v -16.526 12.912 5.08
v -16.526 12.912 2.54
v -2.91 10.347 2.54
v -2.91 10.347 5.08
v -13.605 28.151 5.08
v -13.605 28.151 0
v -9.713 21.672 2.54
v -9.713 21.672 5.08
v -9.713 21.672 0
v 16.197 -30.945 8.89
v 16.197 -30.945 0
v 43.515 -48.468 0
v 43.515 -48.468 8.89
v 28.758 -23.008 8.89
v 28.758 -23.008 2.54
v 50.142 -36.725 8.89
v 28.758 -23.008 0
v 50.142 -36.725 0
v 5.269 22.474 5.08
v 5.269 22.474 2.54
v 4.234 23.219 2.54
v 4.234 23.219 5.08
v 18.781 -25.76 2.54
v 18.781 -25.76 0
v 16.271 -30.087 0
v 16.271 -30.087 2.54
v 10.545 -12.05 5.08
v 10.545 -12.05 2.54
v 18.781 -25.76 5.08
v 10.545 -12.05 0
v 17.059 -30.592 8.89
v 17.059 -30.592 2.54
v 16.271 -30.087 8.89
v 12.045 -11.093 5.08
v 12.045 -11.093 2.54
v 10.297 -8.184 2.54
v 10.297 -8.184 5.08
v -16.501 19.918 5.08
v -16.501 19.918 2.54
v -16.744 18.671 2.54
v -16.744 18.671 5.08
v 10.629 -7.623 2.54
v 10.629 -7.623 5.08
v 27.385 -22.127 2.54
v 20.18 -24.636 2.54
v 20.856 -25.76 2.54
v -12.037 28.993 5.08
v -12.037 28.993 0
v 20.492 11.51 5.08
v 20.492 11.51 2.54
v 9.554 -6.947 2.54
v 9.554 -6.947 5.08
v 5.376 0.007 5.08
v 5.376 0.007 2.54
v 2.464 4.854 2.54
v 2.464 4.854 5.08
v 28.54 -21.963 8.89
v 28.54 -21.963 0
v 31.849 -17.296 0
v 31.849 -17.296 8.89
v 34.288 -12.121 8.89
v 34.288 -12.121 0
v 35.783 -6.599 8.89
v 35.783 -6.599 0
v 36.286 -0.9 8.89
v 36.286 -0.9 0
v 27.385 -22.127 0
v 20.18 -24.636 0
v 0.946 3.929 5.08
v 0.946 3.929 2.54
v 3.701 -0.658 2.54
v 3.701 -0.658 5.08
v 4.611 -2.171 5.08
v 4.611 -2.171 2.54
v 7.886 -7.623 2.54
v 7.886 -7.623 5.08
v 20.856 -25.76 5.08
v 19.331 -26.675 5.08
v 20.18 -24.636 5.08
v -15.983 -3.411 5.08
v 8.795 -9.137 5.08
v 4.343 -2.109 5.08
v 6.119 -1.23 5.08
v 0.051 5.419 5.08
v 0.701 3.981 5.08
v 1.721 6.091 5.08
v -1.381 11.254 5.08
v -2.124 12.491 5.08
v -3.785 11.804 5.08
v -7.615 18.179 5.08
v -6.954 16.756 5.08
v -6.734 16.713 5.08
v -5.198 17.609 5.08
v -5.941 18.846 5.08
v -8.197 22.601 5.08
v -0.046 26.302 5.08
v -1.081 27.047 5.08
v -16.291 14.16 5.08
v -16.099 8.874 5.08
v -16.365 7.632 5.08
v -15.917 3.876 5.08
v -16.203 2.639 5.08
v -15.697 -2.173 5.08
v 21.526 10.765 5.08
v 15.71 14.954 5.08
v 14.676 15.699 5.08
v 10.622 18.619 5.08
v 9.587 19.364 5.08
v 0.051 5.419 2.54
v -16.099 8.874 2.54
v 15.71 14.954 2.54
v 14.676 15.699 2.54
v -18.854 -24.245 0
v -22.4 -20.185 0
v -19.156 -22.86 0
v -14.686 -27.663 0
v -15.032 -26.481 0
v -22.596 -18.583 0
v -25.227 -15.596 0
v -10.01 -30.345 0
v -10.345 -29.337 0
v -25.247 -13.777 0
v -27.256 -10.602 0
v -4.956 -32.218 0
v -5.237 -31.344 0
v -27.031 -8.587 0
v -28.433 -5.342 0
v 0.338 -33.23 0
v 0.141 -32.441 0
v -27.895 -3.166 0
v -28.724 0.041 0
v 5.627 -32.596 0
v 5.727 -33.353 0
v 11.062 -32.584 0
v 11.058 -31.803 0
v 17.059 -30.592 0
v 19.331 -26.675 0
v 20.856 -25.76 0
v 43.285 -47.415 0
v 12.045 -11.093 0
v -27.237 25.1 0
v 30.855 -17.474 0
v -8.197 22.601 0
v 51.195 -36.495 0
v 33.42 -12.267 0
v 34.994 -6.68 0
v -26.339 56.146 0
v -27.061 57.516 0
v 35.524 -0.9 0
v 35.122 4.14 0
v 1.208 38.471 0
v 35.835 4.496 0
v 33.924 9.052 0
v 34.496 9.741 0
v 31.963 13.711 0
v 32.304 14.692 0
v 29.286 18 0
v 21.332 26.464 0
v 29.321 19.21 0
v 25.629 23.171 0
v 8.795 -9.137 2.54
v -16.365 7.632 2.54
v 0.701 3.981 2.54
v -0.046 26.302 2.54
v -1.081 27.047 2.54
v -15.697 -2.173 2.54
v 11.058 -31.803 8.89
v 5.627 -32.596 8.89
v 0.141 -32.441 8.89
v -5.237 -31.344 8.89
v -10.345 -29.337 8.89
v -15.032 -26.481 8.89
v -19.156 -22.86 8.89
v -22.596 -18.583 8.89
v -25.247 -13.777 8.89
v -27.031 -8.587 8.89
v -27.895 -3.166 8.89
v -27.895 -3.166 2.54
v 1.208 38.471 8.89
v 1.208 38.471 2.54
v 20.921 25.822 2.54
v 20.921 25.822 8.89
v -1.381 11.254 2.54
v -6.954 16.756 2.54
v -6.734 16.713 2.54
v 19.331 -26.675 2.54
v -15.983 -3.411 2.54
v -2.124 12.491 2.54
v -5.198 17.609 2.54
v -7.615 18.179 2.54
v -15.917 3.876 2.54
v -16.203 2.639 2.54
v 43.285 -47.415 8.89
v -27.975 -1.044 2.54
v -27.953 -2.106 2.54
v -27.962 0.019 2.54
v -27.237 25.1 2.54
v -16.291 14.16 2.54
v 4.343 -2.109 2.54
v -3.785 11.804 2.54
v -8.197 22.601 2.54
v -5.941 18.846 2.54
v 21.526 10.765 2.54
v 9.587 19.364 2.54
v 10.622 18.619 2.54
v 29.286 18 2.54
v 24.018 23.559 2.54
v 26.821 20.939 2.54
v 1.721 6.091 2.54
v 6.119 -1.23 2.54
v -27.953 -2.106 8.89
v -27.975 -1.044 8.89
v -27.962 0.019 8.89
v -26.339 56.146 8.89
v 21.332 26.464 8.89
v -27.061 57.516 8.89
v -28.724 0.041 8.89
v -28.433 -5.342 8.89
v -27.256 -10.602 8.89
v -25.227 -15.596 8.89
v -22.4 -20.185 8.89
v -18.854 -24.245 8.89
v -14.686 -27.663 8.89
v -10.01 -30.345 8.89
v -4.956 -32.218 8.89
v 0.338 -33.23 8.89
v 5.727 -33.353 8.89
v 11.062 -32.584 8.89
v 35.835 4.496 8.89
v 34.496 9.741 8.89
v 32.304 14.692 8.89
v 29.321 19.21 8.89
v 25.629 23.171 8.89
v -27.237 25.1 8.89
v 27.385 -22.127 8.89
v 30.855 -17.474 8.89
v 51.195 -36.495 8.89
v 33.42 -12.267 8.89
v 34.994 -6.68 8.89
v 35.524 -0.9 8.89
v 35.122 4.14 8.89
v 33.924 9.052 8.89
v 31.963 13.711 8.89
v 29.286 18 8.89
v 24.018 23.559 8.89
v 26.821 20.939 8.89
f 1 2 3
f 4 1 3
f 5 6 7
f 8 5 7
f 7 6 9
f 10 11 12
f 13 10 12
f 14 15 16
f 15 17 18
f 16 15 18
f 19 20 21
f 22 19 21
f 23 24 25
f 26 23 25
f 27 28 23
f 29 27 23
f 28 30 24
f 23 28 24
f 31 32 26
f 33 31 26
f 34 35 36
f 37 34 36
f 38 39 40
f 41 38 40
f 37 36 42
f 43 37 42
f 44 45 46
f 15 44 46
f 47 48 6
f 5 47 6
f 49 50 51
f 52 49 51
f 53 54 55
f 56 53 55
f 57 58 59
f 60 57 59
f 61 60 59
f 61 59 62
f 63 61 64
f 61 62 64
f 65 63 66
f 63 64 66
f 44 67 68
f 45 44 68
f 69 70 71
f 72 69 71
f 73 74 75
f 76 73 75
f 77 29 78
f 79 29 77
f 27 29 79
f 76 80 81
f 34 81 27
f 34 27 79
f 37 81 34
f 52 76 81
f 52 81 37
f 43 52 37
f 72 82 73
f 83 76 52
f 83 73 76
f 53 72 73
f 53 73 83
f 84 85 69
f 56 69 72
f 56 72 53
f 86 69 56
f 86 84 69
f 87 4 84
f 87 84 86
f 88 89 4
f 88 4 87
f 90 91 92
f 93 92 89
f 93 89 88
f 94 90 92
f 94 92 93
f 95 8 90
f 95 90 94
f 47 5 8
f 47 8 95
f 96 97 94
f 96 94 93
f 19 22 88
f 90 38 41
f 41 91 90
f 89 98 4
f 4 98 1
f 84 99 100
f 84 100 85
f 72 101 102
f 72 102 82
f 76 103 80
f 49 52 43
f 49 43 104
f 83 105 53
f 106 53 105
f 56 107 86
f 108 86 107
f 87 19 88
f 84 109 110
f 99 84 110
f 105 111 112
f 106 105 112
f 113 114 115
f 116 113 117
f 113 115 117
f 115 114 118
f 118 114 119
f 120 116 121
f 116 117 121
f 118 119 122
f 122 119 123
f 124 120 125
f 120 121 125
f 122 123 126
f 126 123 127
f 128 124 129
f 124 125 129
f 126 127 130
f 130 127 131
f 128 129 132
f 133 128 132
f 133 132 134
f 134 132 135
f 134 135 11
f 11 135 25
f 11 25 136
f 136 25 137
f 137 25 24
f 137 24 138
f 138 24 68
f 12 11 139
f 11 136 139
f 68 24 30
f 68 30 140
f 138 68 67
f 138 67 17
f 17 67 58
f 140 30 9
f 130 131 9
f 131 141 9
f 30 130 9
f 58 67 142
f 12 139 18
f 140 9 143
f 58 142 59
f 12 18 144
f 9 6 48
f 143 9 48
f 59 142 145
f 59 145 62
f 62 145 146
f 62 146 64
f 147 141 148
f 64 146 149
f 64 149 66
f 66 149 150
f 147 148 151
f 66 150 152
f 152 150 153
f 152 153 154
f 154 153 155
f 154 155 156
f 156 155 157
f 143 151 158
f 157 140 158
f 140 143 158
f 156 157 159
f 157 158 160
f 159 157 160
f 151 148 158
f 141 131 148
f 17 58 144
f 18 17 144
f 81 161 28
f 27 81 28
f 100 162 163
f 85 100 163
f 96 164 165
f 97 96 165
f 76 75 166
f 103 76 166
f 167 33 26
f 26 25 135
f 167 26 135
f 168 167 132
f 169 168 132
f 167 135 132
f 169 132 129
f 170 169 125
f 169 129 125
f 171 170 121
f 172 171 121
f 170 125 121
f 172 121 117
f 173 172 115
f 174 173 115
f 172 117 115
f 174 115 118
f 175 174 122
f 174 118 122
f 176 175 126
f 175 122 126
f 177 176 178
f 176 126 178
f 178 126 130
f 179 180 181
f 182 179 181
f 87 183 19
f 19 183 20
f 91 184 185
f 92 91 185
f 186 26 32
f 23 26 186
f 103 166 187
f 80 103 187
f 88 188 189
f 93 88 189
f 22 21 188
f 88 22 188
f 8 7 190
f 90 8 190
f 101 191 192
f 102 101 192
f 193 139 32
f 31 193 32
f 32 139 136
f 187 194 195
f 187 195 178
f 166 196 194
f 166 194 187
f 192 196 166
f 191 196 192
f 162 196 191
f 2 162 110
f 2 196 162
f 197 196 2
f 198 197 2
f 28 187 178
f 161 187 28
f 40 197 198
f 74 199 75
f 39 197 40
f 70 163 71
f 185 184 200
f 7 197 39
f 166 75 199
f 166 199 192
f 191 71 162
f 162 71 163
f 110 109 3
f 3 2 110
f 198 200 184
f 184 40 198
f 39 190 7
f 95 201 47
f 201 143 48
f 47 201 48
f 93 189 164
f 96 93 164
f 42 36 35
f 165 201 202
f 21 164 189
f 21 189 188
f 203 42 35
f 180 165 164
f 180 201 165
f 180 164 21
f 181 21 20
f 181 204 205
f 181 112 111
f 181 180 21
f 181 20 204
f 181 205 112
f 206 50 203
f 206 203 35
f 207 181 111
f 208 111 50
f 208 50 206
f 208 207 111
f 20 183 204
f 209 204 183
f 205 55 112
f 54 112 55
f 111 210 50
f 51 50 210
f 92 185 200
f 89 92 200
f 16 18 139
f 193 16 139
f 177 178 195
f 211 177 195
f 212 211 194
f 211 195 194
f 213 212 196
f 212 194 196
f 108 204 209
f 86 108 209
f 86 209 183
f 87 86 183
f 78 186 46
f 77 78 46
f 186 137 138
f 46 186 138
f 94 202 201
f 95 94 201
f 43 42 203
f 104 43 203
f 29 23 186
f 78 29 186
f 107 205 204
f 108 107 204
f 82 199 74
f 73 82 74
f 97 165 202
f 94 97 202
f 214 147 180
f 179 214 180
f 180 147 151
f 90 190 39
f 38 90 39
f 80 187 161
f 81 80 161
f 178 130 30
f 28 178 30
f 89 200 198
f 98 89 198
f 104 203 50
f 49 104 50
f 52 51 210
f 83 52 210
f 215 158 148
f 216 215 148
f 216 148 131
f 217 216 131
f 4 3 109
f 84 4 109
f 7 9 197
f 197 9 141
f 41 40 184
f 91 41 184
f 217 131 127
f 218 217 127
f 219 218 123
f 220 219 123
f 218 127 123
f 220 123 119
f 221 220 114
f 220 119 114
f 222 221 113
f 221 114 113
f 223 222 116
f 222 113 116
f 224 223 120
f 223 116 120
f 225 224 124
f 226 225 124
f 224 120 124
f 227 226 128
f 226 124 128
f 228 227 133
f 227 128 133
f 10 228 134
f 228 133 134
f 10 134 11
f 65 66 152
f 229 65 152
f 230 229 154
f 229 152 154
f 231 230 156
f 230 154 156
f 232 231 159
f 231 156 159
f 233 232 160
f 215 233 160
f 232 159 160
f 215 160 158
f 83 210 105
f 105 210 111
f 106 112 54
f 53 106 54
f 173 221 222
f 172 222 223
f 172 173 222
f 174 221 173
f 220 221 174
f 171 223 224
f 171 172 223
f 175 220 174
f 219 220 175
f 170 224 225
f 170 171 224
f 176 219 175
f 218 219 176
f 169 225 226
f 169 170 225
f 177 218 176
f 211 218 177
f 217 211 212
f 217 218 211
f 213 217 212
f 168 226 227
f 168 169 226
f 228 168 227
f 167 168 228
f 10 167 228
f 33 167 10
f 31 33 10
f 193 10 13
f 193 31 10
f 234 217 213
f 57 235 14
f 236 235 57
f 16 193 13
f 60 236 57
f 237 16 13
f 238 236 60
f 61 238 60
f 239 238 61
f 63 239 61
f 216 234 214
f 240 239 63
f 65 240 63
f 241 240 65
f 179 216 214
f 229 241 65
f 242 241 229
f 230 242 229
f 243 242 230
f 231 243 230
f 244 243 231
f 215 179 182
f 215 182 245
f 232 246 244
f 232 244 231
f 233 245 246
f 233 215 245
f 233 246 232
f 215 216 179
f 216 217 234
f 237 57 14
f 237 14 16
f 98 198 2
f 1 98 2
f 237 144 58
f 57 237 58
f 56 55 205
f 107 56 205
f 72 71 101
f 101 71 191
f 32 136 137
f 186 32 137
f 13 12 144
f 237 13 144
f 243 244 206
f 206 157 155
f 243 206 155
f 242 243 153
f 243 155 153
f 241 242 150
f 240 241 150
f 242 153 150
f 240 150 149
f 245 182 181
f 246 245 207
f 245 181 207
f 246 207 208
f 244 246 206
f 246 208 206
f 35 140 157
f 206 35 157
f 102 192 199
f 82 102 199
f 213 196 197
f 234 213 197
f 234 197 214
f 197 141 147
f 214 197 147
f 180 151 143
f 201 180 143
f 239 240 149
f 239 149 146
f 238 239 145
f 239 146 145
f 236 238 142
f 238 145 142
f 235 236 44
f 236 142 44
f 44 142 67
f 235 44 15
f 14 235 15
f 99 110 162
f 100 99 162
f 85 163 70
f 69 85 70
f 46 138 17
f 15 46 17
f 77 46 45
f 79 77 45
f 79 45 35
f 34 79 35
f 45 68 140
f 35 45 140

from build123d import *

# Parameters (mm, degrees)
F1_DEPTH = 8.89
F2_DEPTH = 5.08
F3_DEPTH = 2.54


with BuildPart() as f1:
    # F0 (on Top) → F1 (new body)
    with BuildSketch(Plane.XY):
        with BuildLine():
            Line((21.332066, 26.463705), (-27.061316, 57.515545))
            Line((-27.061316, 57.515545), (-28.724159, 0.040585))
            ThreePointArc((-28.724159, 0.040585), (-14.685947, -27.662523), (16.197077, -30.944668))
            Line((16.197077, -30.944668), (43.515381, -48.467725))
            Line((43.515381, -48.467725), (51.195109, -36.495092))
            Line((51.195109, -36.495092), (28.540187, -21.963315))
            ThreePointArc((28.540187, -21.963315), (34.288342, -12.121049), (36.286243, -0.899646))
            ThreePointArc((36.286243, -0.899646), (32.30379, 14.691861), (21.332066, 26.463705))
        make_face()
        with BuildLine():
            Line((-27.236827, 25.100127), (-26.338607, 56.146439))
            Line((-26.338607, 56.146439), (1.208299, 38.470838))
            Line((1.208299, 38.470838), (20.920554, 25.822377))
            ThreePointArc((20.920554, 25.822377), (25.459016, 22.291583), (29.286224, 18.000124))
            ThreePointArc((29.286224, 18.000124), (33.924433, 9.051663), (35.524243, -0.899646))
            ThreePointArc((35.524243, -0.899646), (33.419565, -12.267027), (27.384567, -22.127343))
            Line((27.384567, -22.127343), (28.75755, -23.008029))
            Line((28.75755, -23.008029), (50.142303, -36.725069))
            Line((50.142303, -36.725069), (43.285403, -47.41492))
            Line((43.285403, -47.41492), (17.059054, -30.592287))
            Line((17.059054, -30.592287), (16.271061, -30.086836))
            ThreePointArc((16.271061, -30.086836), (-12.750558, -28.010409), (-27.894731, -3.166497))
            ThreePointArc((-27.894731, -3.166497), (-27.968577, -1.574824), (-27.962478, 0.018549))
            Line((-27.962478, 0.018549), (-27.236827, 25.100127))
        make_face(mode=Mode.SUBTRACT)
    extrude(amount=F1_DEPTH)



with BuildPart() as f2:
    # F0 (on Top) → F2 (new body)
    with BuildSketch(Plane.XY):
        Polygon((-13.605105, 28.150606), (-9.713301, 21.672324), (-7.614988, 18.17948), (-6.73406, 16.713091), (-3.785167, 11.804375), (-2.909715, 10.347101), (0.050701, 5.419203), (0.94598, 3.928926), (3.701448, -0.657816), (4.610738, -2.171416), (7.88597, -7.623355), (8.79526, -9.136955), (10.545028, -12.049613), (18.781333, -25.759736), (19.331383, -26.675345), (20.855503, -25.759736), (20.180433, -24.636017), (12.044667, -11.093252), (10.296888, -8.183906), (9.553734, -6.946853), (6.119241, -1.22981), (5.376086, 0.007243), (2.464367, 4.85408), (1.721212, 6.091132), (-1.380529, 11.254279), (-2.123684, 12.491331), (-5.198242, 17.609229), (-5.941397, 18.846282), (-8.196821, 22.600652), (-12.036798, 28.992664), align=None)
        Polygon((-1.081142, 27.047468), (-5.941397, 18.846282), (-5.198242, 17.609229), (-0.046492, 26.302285), align=None)
        Polygon((4.234035, 23.219336), (-2.123684, 12.491331), (-1.380529, 11.254279), (5.268685, 22.474153), align=None)
        Polygon((9.587057, 19.363947), (1.721212, 6.091132), (2.464367, 4.85408), (10.621708, 18.618764), align=None)
        Polygon((5.376086, 0.007243), (6.119241, -1.22981), (15.710174, 14.953916), (14.675524, 15.699099), align=None)
        Polygon((9.553734, -6.946853), (10.296888, -8.183906), (10.629086, -7.623355), (21.526467, 10.764868), (20.491817, 11.510051), align=None)
        Polygon((-6.73406, 16.713091), (-7.614988, 18.17948), (-16.500566, 19.917602), (-16.744372, 18.671223), (-6.954169, 16.756147), align=None)
        Polygon((-2.909715, 10.347101), (-3.785167, 11.804375), (-16.291279, 14.160487), (-16.526407, 12.912442), align=None)
        Polygon((0.94598, 3.928926), (0.050701, 5.419203), (-16.099113, 8.874321), (-16.364806, 7.632425), (0.701064, 3.981324), align=None)
        Polygon((4.342513, -2.109431), (4.610738, -2.171416), (3.701448, -0.657816), (-15.917408, 3.875942), (-16.203358, 2.638553), align=None)
        Polygon((-15.983448, -3.410797), (8.79526, -9.136955), (7.88597, -7.623355), (-15.697497, -2.173408), align=None)
    extrude(amount=F2_DEPTH)


with BuildPart() as f1_1:
    add(f1.part)

    add(f2.part)  # F3 merges F2
    # F0 (on Top) → F3 (join)
    with BuildSketch(Plane.XY):
        with BuildLine():
            Line((20.920554, 25.822377), (1.208299, 38.470838))
            Line((1.208299, 38.470838), (-8.196821, 22.600652))
            Line((-8.196821, 22.600652), (-5.941397, 18.846282))
            Line((-5.941397, 18.846282), (-1.081142, 27.047468))
            Line((-1.081142, 27.047468), (-0.046492, 26.302285))
            Line((-0.046492, 26.302285), (-5.198242, 17.609229))
            Line((-5.198242, 17.609229), (-2.123684, 12.491331))
            Line((-2.123684, 12.491331), (4.234035, 23.219336))
            Line((4.234035, 23.219336), (5.268685, 22.474153))
            Line((5.268685, 22.474153), (-1.380529, 11.254279))
            Line((-1.380529, 11.254279), (1.721212, 6.091132))
            Line((1.721212, 6.091132), (9.587057, 19.363947))
            Line((9.587057, 19.363947), (10.621708, 18.618764))
            Line((10.621708, 18.618764), (2.464367, 4.85408))
            Line((2.464367, 4.85408), (5.376086, 0.007243))
            Line((5.376086, 0.007243), (14.675524, 15.699099))
            Line((14.675524, 15.699099), (15.710174, 14.953916))
            Line((15.710174, 14.953916), (6.119241, -1.22981))
            Line((6.119241, -1.22981), (9.553734, -6.946853))
            Line((9.553734, -6.946853), (20.491817, 11.510051))
            Line((20.491817, 11.510051), (21.526467, 10.764868))
            Line((21.526467, 10.764868), (10.629086, -7.623355))
            Line((10.629086, -7.623355), (10.296888, -8.183906))
            Line((10.296888, -8.183906), (12.044667, -11.093252))
            Line((12.044667, -11.093252), (29.286224, 18.000124))
            ThreePointArc((29.286224, 18.000124), (25.459016, 22.291583), (20.920554, 25.822377))
        make_face()
        with BuildLine():
            Line((-9.713301, 21.672324), (-27.236827, 25.100127))
            Line((-27.236827, 25.100127), (-27.962478, 0.018549))
            ThreePointArc((-27.962478, 0.018549), (-27.968577, -1.574824), (-27.894731, -3.166497))
            Line((-27.894731, -3.166497), (10.545028, -12.049613))
            Line((10.545028, -12.049613), (8.79526, -9.136955))
            Line((8.79526, -9.136955), (-15.983448, -3.410797))
            Line((-15.983448, -3.410797), (-15.697497, -2.173408))
            Line((-15.697497, -2.173408), (7.88597, -7.623355))
            Line((7.88597, -7.623355), (4.610738, -2.171416))
            Line((4.610738, -2.171416), (4.342513, -2.109431))
            Line((4.342513, -2.109431), (-16.203358, 2.638553))
            Line((-16.203358, 2.638553), (-15.917408, 3.875942))
            Line((-15.917408, 3.875942), (3.701448, -0.657816))
            Line((3.701448, -0.657816), (0.94598, 3.928926))
            Line((0.94598, 3.928926), (0.701064, 3.981324))
            Line((0.701064, 3.981324), (-16.364806, 7.632425))
            Line((-16.364806, 7.632425), (-16.099113, 8.874321))
            Line((-16.099113, 8.874321), (0.050701, 5.419203))
            Line((0.050701, 5.419203), (-2.909715, 10.347101))
            Line((-2.909715, 10.347101), (-16.526407, 12.912442))
            Line((-16.526407, 12.912442), (-16.291279, 14.160487))
            Line((-16.291279, 14.160487), (-3.785167, 11.804375))
            Line((-3.785167, 11.804375), (-6.73406, 16.713091))
            Line((-6.73406, 16.713091), (-6.954169, 16.756147))
            Line((-6.954169, 16.756147), (-16.744372, 18.671223))
            Line((-16.744372, 18.671223), (-16.500566, 19.917602))
            Line((-16.500566, 19.917602), (-7.614988, 18.17948))
            Line((-7.614988, 18.17948), (-9.713301, 21.672324))
        make_face()
        Polygon((28.75755, -23.008029), (27.384567, -22.127343), (20.180433, -24.636017), (20.855503, -25.759736), align=None)
        Polygon((18.781333, -25.759736), (16.271061, -30.086836), (17.059054, -30.592287), (19.331383, -26.675345), align=None)
    extrude(amount=F3_DEPTH)


solid = f1_1.part
